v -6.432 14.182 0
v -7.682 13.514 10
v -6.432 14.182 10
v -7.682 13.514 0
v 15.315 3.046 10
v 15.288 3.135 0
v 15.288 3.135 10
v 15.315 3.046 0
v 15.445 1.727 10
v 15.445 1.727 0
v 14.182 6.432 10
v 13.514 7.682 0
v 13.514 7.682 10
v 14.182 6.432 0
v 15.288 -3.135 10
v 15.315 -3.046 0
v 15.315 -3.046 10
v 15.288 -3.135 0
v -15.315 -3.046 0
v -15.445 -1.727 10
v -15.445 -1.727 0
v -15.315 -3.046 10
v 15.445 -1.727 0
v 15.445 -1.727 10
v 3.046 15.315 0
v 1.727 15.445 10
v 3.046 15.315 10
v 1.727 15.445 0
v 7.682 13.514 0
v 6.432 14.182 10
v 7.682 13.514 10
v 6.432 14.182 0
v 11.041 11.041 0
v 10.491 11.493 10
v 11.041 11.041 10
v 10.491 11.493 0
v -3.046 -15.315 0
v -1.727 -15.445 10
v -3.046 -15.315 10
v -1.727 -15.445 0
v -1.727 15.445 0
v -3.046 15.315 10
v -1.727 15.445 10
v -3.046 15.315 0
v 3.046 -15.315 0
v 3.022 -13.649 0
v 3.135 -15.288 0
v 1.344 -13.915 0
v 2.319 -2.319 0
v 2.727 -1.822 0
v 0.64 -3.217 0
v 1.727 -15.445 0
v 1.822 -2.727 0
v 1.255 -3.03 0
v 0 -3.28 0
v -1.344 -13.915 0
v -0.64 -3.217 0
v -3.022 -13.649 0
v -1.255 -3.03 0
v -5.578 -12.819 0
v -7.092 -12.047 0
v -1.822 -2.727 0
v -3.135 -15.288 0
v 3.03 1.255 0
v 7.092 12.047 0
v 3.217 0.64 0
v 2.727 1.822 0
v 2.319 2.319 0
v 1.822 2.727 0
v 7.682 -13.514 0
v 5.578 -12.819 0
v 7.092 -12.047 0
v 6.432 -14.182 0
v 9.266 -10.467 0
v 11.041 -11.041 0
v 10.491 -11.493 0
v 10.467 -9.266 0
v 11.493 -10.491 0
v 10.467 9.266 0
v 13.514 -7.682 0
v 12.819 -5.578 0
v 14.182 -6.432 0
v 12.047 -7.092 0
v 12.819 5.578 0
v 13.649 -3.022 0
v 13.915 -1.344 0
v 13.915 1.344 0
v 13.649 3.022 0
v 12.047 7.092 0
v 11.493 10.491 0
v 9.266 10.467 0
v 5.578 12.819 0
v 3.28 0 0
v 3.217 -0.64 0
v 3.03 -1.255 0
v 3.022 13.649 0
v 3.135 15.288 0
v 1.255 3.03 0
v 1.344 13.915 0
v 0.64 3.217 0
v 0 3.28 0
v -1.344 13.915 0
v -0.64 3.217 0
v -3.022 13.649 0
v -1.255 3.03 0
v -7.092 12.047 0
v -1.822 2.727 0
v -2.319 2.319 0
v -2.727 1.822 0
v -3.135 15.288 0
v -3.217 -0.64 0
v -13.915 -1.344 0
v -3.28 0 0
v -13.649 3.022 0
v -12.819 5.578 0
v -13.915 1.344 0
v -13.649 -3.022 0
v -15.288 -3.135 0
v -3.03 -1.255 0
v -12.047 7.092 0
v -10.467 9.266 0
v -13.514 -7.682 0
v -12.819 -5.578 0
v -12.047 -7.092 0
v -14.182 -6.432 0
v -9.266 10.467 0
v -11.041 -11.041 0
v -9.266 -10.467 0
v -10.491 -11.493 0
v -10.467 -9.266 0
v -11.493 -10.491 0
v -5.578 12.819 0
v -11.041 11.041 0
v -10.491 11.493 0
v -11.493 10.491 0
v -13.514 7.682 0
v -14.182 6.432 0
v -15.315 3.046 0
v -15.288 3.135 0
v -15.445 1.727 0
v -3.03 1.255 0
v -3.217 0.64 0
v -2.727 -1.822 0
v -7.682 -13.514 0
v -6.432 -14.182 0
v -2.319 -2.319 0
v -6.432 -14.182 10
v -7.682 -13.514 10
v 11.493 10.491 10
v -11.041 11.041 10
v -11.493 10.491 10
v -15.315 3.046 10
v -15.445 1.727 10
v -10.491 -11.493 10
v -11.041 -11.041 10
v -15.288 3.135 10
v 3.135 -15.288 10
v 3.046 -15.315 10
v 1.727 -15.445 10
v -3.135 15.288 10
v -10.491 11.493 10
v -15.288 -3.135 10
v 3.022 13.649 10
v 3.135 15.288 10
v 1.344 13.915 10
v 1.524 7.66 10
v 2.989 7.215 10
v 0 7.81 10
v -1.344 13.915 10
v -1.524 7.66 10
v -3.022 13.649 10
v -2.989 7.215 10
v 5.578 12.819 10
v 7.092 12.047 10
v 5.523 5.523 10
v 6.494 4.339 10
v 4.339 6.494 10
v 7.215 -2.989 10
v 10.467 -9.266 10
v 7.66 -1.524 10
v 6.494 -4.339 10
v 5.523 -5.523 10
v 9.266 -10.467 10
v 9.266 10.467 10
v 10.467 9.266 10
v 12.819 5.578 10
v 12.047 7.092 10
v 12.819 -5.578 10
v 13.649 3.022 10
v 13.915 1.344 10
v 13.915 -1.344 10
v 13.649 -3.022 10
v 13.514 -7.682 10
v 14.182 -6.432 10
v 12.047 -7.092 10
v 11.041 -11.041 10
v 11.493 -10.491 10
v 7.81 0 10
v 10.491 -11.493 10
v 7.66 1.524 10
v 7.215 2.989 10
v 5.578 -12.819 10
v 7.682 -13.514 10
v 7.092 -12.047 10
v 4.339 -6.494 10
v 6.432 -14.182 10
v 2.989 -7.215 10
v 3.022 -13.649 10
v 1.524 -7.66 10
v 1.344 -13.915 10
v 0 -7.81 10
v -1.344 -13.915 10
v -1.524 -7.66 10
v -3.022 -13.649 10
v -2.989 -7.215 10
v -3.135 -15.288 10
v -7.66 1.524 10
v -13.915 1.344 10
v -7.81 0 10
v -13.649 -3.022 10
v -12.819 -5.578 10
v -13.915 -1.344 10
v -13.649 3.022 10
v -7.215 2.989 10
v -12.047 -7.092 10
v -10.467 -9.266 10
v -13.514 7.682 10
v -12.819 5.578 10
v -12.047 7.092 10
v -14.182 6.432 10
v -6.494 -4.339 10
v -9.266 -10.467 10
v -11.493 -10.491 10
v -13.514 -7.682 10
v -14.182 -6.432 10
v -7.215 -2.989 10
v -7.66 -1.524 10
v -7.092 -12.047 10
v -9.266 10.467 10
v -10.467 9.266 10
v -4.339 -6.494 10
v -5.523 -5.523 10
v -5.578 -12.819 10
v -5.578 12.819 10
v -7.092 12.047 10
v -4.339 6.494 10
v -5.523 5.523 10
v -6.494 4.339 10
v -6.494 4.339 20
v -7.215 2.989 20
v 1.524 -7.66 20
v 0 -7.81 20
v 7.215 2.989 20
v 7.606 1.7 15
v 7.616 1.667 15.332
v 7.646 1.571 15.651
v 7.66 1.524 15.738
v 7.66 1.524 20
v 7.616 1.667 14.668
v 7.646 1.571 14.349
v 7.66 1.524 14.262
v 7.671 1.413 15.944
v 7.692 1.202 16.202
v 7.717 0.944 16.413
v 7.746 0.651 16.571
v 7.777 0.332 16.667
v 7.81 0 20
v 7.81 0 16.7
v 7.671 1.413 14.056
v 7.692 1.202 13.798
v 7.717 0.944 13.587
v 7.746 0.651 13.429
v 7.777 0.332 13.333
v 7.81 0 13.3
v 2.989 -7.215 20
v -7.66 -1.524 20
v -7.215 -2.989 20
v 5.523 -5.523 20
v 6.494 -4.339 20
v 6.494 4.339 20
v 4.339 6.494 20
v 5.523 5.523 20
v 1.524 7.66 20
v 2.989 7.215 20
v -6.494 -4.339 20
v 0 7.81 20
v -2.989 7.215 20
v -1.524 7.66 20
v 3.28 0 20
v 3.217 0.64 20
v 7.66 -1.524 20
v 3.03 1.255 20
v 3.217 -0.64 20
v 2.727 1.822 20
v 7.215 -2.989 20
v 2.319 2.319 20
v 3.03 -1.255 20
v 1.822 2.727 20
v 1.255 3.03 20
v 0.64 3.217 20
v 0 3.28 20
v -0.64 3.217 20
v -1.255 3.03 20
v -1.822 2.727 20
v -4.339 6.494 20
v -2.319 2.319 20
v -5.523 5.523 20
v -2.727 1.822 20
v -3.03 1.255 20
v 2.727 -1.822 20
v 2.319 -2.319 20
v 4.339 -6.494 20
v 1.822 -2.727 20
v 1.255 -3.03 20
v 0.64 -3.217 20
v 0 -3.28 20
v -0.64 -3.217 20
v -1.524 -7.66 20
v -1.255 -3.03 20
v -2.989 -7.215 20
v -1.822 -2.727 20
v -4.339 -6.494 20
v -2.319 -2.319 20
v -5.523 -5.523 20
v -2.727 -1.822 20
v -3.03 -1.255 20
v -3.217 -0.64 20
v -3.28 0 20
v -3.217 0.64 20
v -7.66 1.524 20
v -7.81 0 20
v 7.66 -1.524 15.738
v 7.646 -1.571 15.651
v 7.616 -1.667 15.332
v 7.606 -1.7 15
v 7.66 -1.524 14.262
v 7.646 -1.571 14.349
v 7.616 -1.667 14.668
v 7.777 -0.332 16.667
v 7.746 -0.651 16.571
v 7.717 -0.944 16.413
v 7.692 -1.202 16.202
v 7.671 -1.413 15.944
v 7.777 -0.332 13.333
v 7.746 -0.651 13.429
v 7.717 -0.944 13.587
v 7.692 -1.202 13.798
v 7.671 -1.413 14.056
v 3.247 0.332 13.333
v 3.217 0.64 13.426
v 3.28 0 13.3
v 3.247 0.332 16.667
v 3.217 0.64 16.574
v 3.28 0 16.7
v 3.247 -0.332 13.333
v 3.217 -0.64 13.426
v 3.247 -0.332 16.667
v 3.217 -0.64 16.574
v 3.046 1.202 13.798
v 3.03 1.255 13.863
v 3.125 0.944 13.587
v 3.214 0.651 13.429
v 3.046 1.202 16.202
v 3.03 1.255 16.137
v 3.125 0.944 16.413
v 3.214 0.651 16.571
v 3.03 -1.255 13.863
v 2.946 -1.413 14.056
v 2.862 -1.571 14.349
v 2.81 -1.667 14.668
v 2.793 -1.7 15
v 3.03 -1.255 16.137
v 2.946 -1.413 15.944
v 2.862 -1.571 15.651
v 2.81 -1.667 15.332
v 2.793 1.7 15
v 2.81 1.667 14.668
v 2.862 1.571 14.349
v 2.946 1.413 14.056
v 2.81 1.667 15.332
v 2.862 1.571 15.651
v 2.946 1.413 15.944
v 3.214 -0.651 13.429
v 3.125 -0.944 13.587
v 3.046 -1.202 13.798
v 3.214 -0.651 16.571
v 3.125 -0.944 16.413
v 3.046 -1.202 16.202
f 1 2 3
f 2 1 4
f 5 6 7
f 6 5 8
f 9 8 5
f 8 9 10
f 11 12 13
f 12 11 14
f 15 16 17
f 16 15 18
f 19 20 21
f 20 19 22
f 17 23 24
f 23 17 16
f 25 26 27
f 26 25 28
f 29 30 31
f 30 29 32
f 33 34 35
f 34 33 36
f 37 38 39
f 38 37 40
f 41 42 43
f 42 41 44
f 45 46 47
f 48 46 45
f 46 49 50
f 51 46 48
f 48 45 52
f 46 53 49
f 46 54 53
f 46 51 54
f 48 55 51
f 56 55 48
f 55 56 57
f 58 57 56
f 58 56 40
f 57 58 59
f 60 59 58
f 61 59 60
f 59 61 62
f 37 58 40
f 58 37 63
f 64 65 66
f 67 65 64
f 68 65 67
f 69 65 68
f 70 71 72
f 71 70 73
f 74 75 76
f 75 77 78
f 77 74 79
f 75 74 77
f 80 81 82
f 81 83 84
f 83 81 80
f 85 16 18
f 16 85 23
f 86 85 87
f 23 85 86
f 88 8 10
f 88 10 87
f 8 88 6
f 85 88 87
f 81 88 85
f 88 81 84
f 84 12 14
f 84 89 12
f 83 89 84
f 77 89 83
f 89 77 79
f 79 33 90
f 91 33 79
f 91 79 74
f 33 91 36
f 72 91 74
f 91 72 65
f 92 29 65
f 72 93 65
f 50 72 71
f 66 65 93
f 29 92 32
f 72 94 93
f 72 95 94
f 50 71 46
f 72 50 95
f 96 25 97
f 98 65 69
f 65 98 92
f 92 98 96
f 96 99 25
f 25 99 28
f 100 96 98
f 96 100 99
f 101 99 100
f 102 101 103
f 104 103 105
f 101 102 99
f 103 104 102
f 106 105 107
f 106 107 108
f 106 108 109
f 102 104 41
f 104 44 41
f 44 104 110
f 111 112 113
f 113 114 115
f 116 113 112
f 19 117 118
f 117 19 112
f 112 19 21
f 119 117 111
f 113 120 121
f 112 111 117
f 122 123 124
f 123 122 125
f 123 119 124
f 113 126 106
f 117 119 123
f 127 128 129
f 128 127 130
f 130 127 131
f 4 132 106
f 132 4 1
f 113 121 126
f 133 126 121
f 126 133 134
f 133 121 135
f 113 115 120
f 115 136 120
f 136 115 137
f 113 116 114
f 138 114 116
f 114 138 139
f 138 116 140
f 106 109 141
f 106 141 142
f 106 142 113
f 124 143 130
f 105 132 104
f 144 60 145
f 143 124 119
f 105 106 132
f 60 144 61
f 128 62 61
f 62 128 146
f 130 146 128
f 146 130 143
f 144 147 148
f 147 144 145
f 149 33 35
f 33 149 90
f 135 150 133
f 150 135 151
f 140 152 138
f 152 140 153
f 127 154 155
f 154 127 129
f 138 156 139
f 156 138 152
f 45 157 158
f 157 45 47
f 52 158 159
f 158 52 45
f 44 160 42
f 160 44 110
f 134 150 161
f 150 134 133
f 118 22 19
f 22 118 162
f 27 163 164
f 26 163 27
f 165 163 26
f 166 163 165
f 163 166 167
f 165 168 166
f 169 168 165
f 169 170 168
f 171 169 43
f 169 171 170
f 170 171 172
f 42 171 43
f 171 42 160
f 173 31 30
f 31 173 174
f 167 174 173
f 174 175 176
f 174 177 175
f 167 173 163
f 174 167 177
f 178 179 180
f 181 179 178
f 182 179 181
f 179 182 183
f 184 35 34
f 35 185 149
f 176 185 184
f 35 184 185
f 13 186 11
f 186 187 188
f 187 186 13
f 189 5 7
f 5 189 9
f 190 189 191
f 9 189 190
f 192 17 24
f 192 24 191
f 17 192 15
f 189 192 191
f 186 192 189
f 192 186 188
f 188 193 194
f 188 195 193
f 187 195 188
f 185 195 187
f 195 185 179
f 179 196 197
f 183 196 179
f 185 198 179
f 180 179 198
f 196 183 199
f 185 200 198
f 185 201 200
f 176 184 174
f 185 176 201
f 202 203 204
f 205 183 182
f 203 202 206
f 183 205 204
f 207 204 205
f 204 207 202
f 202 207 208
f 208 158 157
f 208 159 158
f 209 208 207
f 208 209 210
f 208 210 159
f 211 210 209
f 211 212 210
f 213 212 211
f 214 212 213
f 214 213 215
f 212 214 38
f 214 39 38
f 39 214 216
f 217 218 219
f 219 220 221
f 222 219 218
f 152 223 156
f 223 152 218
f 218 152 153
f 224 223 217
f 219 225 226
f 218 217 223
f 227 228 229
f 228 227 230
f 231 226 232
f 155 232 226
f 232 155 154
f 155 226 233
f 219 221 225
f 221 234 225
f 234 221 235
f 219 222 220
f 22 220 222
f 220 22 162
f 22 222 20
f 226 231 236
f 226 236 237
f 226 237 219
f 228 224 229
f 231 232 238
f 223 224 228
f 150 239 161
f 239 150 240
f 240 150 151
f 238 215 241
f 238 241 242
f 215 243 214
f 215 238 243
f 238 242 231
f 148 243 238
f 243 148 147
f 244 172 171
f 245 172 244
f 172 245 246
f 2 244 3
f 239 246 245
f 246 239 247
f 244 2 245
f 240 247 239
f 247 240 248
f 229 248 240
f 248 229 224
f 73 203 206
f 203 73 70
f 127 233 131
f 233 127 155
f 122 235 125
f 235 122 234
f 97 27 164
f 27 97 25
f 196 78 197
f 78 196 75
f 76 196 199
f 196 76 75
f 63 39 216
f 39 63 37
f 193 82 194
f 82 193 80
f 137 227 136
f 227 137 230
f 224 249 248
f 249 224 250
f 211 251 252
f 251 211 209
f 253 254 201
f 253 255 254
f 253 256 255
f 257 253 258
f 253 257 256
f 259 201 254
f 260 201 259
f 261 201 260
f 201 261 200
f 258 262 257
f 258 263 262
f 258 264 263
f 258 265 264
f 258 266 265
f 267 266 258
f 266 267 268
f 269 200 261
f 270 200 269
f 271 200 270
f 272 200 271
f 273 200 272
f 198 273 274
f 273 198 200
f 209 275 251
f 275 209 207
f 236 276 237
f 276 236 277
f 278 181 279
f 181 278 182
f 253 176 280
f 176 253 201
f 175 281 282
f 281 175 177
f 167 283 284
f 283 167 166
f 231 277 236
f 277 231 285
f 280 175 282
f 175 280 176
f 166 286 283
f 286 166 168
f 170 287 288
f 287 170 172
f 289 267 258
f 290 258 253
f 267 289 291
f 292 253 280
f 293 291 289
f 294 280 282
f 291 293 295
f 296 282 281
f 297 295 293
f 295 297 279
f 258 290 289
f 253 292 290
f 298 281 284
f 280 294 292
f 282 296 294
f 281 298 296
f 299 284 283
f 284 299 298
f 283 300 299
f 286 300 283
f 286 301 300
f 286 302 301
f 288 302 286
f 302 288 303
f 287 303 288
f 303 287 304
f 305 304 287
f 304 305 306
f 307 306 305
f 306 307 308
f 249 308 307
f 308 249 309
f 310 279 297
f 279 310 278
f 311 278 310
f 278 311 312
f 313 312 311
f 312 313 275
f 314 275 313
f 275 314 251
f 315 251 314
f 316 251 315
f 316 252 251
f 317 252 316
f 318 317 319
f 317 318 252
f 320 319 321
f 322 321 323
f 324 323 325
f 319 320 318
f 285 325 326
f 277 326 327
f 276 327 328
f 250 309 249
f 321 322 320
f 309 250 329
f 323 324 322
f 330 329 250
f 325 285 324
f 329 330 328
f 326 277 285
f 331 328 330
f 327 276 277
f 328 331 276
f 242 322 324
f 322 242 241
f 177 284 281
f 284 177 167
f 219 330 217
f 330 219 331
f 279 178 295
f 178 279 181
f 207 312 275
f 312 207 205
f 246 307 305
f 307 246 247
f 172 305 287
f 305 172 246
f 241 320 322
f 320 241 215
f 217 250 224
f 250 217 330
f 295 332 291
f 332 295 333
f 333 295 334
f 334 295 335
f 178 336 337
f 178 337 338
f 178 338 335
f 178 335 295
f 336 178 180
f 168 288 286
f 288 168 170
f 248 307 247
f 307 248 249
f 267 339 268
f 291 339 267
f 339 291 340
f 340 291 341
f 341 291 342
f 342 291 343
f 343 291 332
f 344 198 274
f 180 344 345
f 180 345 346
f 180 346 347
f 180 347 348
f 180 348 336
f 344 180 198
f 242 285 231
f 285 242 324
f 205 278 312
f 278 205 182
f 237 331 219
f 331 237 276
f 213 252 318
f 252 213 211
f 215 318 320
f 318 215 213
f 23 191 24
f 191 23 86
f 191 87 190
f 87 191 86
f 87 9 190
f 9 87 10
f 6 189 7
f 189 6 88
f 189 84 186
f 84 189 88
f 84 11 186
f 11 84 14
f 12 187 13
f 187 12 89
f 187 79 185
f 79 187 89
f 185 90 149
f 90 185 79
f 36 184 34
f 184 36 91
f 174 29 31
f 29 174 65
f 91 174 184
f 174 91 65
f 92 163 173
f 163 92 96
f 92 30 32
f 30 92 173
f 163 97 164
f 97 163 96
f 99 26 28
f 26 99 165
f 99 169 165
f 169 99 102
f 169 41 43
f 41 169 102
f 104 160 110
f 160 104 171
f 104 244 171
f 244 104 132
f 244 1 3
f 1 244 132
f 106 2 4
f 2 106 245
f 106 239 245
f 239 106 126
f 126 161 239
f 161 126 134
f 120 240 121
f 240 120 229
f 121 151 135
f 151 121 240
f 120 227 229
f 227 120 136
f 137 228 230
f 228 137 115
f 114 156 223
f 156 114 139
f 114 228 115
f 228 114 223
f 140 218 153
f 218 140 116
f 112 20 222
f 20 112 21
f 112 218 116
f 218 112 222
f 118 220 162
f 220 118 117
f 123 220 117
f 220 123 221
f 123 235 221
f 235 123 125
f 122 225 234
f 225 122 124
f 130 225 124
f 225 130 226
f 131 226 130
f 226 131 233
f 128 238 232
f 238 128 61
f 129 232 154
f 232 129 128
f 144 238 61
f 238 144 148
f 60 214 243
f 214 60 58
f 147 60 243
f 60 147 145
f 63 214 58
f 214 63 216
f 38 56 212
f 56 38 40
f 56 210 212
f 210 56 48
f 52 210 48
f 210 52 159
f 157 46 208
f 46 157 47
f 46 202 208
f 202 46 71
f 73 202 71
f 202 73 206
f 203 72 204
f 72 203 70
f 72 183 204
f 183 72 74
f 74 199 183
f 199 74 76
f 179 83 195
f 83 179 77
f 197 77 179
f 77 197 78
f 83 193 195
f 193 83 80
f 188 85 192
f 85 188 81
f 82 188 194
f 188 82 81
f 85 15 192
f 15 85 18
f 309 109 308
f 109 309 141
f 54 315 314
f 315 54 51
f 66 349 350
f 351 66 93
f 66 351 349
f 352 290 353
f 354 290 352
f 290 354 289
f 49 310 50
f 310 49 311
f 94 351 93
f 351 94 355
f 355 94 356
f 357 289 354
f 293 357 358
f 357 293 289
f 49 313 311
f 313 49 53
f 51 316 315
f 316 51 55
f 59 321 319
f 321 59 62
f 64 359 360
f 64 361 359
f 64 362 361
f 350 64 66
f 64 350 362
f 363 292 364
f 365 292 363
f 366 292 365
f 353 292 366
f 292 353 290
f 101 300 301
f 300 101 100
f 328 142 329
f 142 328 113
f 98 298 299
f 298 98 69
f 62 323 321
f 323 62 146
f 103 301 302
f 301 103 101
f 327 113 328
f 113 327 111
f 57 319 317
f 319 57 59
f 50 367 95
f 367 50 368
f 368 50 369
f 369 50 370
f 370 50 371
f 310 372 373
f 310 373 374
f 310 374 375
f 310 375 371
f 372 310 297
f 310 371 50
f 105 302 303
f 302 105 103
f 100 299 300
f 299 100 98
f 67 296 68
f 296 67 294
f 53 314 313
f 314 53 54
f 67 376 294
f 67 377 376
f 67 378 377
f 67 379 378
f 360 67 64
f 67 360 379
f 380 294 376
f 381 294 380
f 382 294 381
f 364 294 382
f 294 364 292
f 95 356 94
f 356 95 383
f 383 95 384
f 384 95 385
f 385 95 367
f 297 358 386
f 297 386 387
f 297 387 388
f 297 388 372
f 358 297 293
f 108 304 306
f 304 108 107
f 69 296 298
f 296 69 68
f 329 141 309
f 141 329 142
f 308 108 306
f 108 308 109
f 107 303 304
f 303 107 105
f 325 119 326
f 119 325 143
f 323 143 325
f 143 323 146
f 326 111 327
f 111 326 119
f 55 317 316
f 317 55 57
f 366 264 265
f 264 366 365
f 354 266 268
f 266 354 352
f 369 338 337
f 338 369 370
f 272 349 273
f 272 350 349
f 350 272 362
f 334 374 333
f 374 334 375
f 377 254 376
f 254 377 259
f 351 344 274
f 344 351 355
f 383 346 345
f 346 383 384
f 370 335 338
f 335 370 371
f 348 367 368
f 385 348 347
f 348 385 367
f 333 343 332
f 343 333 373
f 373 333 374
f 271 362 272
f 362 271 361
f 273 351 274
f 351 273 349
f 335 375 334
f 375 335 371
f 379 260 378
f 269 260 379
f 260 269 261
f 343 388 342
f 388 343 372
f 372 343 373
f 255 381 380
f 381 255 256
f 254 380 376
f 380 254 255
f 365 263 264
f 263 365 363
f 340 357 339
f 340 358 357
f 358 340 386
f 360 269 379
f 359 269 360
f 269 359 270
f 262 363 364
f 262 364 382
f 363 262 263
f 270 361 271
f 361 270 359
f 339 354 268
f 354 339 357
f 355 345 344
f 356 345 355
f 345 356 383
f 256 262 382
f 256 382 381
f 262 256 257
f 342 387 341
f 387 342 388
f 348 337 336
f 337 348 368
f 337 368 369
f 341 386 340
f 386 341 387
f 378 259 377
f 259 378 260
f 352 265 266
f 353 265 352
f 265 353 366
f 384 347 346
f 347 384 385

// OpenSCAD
$fn = 32;

// ----------------------------------------------------------------------
// Timing pulley: HTD5 20T, pitch 5 mm, 31.23 mm x 20 mm
// ----------------------------------------------------------------------

// --- parameters (mm) ---
pitch = 5;                // belt pitch
teeth = 20;               // number of grooves
belt_w = 10;              // belt width between the flanges
tip_d = 31.23;            // tip circle diameter
root_d = 29.03;           // groove bottom diameter
groove_h = 1.1;           // groove depth
tooth_w = 3.2;            // groove width at the tip circle
bore_d = 6.56;            // shaft bore
hub_d = 15.62;            // hub diameter
hub_h = 10;               // hub above the flange
bottom_z = 0;             // lowest point of the pulley
top_z = 20;               // highest point of the pulley
set_d = 3.4;              // set screw tap hole

module rim() {
  cylinder(h = belt_w, d = tip_d);
}

module groove_cutter() {
  /* belt tooth groove: deeper than wide, cut through the belt width */
  translate([root_d / 2, 0, 0])
    linear_extrude(height = belt_w)
      polygon(points = [[-0.6, -tooth_w * 0.42], [groove_h + 0.6, -tooth_w * 0.6],
                        [groove_h + 0.6, tooth_w * 0.6], [-0.6, tooth_w * 0.42]]);
}

module hub() {
  translate([0, 0, bottom_z]) cylinder(h = top_z - bottom_z, d = hub_d);
}

difference() {
  union() {
    rim();
    hub();
  }
  for (i = [0 : teeth - 1]) rotate([0, 0, i * 360 / teeth]) groove_cutter();
  translate([0, 0, bottom_z - 1]) cylinder(h = top_z - bottom_z + 2, d = bore_d);
  translate([-1, 0, top_z - hub_h * 0.5]) rotate([0, 90, 0]) cylinder(h = hub_d / 2 + 3, d = set_d);
}
